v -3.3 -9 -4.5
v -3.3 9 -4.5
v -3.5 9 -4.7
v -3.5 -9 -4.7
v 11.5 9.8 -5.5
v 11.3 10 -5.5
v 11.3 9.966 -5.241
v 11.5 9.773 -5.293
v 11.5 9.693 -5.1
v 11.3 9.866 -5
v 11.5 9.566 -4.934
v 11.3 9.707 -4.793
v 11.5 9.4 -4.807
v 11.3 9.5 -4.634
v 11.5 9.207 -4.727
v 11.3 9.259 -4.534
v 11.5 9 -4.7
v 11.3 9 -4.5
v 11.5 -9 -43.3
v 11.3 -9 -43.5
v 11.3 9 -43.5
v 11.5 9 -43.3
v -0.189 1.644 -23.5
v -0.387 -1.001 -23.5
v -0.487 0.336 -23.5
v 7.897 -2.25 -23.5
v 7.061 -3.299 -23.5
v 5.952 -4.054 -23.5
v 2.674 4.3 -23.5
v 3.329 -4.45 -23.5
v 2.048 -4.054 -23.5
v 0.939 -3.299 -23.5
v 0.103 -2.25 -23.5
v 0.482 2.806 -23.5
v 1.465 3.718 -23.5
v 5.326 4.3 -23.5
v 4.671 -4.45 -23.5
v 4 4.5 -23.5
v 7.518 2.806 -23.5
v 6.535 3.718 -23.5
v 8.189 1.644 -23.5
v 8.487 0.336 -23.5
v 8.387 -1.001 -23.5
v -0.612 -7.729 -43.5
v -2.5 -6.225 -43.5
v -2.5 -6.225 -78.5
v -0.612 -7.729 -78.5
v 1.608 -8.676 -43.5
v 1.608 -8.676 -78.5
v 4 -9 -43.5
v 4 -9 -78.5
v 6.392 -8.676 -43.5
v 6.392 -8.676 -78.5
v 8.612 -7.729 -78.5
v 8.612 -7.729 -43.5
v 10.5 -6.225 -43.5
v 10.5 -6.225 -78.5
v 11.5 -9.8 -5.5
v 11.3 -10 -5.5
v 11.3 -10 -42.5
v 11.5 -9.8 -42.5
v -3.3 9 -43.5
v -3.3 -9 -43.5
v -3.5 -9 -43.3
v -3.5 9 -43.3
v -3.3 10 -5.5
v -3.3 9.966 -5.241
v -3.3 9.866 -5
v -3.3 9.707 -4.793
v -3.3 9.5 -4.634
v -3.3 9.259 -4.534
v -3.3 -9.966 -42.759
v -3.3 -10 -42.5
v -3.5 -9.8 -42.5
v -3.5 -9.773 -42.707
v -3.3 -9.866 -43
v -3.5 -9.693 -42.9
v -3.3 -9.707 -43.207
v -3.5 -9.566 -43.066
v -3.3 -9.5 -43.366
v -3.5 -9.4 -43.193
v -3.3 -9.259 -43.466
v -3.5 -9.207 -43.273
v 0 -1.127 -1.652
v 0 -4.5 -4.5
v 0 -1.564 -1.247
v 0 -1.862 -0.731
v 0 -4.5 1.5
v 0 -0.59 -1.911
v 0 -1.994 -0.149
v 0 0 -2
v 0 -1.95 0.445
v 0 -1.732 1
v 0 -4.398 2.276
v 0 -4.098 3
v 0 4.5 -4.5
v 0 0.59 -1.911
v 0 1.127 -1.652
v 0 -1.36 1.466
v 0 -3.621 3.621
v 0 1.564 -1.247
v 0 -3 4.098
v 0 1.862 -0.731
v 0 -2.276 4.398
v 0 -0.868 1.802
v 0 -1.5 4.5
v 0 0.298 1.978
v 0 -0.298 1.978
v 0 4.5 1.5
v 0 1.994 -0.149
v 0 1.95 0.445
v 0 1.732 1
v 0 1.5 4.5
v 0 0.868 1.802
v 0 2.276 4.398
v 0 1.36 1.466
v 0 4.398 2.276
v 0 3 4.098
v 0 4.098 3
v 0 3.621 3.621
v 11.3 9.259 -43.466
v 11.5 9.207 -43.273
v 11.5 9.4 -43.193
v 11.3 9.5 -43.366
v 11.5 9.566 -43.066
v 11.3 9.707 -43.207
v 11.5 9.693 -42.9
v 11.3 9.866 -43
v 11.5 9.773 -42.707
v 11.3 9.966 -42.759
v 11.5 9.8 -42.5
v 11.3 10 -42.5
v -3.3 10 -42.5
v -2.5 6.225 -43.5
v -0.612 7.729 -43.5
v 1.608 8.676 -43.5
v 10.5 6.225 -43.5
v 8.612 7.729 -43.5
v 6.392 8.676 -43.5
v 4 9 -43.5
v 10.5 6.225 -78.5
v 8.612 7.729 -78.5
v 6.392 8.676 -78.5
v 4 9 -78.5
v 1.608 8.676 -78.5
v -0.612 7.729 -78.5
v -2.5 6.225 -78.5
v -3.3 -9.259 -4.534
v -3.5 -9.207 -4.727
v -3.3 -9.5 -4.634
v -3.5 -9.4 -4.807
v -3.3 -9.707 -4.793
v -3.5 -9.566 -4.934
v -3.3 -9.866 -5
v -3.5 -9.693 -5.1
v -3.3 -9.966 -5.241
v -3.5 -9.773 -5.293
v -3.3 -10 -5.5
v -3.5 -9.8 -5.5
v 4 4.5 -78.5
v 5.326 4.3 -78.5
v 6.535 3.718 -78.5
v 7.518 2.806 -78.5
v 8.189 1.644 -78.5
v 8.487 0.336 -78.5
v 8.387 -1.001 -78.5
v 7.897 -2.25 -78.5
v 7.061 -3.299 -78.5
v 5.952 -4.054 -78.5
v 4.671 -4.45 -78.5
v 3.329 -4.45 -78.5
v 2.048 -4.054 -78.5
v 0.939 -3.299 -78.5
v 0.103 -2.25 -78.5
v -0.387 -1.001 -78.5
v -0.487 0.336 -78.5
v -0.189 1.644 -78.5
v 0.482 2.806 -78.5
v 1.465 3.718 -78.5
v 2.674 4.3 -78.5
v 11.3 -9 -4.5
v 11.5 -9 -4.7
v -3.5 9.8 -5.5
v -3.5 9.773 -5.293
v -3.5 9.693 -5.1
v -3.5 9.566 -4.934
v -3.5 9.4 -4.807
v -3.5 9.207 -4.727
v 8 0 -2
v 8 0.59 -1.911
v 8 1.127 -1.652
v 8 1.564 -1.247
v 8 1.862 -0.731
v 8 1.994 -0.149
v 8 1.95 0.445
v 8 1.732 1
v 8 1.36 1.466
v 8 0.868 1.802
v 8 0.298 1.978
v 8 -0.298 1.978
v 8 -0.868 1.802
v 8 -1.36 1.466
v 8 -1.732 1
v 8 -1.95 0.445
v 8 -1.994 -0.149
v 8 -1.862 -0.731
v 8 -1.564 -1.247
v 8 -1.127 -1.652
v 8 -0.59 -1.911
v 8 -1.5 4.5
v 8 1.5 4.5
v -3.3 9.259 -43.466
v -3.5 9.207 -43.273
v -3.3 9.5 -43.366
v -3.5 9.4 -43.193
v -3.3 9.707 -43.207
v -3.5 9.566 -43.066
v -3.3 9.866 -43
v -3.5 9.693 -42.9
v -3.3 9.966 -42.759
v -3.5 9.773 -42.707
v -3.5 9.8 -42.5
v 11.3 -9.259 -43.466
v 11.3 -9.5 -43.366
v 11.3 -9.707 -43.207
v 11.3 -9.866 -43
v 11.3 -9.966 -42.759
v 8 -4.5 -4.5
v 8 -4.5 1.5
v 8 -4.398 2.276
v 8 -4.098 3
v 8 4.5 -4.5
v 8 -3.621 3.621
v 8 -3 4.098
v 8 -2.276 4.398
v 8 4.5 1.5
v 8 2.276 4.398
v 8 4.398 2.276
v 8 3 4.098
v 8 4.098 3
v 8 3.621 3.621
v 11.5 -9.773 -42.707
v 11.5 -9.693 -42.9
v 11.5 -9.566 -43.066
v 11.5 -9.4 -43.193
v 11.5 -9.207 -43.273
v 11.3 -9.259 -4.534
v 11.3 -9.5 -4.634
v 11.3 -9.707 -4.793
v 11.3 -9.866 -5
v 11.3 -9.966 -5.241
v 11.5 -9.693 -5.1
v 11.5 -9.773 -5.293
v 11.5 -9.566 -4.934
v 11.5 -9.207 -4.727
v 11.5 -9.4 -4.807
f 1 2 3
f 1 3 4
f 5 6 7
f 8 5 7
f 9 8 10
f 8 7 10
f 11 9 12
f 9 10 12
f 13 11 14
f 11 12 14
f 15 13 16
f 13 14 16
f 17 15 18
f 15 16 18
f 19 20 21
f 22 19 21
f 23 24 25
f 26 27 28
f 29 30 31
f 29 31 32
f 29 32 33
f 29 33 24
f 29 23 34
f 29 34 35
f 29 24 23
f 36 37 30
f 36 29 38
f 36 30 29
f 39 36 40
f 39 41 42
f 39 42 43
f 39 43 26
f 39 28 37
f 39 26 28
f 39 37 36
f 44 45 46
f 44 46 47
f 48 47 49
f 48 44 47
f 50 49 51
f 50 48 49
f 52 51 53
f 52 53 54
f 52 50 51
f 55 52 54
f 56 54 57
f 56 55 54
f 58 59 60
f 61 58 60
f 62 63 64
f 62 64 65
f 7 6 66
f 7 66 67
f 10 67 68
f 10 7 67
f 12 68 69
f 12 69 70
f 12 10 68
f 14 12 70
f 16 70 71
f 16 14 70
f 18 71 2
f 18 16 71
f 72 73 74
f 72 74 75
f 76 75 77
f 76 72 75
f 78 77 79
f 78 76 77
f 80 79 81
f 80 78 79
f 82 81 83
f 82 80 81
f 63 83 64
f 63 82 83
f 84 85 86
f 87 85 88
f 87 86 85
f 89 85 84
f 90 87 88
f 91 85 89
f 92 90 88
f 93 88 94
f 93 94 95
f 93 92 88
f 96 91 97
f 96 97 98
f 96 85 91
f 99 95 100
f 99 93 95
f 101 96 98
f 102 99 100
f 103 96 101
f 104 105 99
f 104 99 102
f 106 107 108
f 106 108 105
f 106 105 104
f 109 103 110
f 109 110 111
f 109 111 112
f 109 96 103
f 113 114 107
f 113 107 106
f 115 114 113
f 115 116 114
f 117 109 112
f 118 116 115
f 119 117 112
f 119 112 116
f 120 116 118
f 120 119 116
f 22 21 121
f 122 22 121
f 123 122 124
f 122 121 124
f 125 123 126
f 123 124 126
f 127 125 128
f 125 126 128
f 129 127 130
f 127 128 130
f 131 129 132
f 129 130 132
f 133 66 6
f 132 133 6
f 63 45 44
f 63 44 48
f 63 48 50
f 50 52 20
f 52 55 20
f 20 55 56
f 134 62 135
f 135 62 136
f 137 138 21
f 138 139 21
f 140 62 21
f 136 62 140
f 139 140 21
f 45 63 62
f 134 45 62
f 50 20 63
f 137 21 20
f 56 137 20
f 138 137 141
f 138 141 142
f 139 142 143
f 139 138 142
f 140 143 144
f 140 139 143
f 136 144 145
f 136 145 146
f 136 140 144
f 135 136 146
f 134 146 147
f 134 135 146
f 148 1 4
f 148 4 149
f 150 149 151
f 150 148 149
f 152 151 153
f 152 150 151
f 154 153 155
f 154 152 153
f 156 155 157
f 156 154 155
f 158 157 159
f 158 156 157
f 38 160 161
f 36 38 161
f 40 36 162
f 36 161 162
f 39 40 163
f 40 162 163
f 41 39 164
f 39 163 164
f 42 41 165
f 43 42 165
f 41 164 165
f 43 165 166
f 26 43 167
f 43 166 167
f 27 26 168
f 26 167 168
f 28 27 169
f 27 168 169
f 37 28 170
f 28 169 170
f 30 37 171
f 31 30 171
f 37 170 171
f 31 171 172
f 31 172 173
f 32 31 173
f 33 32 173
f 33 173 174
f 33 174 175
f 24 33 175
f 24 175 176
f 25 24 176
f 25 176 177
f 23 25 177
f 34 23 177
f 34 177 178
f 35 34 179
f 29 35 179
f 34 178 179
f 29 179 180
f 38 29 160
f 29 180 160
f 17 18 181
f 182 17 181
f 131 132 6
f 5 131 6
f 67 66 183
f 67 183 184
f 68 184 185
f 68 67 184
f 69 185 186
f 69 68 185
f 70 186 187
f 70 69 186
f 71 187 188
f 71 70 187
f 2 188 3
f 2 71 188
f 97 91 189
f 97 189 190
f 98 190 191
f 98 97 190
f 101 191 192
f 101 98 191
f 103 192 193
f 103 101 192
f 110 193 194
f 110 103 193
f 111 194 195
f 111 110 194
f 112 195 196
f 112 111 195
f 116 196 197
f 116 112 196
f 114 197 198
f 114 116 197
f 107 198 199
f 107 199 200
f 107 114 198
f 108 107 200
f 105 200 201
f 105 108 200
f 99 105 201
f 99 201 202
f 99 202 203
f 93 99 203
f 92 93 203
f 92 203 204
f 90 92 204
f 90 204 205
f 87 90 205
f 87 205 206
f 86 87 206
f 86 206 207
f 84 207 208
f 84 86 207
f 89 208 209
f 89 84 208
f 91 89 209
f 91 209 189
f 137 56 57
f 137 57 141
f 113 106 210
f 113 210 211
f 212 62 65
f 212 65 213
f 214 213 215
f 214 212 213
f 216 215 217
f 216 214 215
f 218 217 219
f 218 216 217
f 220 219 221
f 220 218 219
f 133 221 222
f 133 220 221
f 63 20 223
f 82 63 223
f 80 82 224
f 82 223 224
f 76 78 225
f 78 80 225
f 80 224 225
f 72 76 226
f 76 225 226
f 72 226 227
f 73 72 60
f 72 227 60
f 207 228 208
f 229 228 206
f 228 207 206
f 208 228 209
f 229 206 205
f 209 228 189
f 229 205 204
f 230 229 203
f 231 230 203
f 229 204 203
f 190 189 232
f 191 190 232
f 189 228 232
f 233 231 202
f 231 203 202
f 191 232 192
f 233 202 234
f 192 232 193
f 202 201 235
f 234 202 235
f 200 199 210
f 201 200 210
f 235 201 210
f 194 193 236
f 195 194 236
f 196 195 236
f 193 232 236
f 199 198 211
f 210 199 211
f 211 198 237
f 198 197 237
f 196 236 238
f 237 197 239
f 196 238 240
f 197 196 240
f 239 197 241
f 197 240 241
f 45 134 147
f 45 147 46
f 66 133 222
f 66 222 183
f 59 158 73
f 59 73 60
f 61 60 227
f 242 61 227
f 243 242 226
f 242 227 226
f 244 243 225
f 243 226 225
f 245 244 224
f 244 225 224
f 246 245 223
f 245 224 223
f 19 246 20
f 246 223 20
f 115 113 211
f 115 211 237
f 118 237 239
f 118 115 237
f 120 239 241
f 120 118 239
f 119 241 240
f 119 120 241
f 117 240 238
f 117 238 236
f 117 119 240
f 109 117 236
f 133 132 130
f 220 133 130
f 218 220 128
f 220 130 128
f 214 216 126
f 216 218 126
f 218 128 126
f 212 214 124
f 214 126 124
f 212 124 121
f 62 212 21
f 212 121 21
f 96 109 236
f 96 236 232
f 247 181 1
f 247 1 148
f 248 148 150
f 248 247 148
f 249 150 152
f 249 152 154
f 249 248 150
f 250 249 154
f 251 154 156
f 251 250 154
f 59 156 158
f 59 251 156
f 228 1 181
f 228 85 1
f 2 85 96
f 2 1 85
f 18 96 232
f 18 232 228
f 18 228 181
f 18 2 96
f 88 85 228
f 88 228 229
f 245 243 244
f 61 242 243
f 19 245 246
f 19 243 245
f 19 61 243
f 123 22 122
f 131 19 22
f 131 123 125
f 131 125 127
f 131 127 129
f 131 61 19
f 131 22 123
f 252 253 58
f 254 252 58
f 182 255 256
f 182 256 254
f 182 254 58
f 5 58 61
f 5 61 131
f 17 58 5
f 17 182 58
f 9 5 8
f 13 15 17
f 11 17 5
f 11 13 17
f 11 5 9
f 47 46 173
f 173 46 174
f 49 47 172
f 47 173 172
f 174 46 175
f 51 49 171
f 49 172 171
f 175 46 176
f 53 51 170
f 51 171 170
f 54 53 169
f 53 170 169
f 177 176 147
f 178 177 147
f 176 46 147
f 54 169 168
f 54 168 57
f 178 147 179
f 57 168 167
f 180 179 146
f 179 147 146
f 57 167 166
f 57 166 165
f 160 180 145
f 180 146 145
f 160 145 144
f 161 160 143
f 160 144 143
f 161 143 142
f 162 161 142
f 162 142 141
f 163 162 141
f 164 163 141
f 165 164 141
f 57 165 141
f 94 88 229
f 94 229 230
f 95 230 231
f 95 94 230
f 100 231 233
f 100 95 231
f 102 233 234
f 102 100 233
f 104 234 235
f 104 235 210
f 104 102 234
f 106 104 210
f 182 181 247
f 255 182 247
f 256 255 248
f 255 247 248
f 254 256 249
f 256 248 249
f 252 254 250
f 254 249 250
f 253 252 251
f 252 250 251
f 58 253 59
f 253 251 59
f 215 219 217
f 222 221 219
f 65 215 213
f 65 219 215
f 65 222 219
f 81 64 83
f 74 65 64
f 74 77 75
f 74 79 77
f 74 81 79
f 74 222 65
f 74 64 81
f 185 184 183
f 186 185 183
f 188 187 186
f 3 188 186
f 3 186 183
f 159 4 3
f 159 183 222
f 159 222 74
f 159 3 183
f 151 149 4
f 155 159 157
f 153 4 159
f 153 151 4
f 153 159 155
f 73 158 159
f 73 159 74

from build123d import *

# Parameters (mm, degrees)
SKETCH_1_R          = 2
EXTRUDE_1_DEPTH     = 8
EXTRUDE_2_DEPTH     = 39
EXTRUDE_3_DEPTH     = 35
SKETCH_4_R          = 4.5
CUT_EXTRUDE_1_DEPTH = 55
FILLET_1_R          = 1
CHAMFER_1_SIZE      = 0.2


with BuildPart() as part:
    # 草图1 → 凸台-拉伸1 (new body)
    with BuildSketch(Plane(origin=(0, 0, 0), x_dir=(0, 0, -1), z_dir=(1, 0, 0))):
        with BuildLine():
            Line((0, 4.5), (4.5, 4.5))
            Line((4.5, 4.5), (4.5, -4.5))
            Line((4.5, -4.5), (-1.5, -4.5))
            ThreePointArc((-1.5, -4.5), (-3.621320344, -3.621320344), (-4.5, -1.5))
            Line((-4.5, -1.5), (-4.5, 1.5))
            ThreePointArc((-4.5, 1.5), (-3.621320344, 3.621320344), (-1.5, 4.5))
            Line((-1.5, 4.5), (0, 4.5))
        make_face()
        Circle(SKETCH_1_R, mode=Mode.SUBTRACT)
    extrude(amount=EXTRUDE_1_DEPTH)

    # 草图2 → 凸台-拉伸2 (add)
    with BuildSketch(Plane(origin=(0, 0, -4.5), x_dir=(-1, 0, 0), z_dir=(0, 0, -1))):
        Polygon((-4, 10), (3.5, 10), (3.5, -10), (-11.5, -10), (-11.5, 10), align=None)
    extrude(amount=EXTRUDE_2_DEPTH)

    # 草图3 → 凸台-拉伸3 (add)
    with BuildSketch(Plane(origin=(0, 0, -43.5), x_dir=(-1, 0, 0), z_dir=(0, 0, -1))):
        with BuildLine():
            Line((2.5, 6.224949799), (2.5, -6.224949799))
            ThreePointArc((2.5, -6.224949799), (-4, -9), (-10.5, -6.224949799))
            Line((-10.5, -6.224949799), (-10.5, 6.224949799))
            ThreePointArc((-10.5, 6.224949799), (-4, 9), (2.5, 6.224949799))
        make_face()
    extrude(amount=EXTRUDE_3_DEPTH)

    # 草图4 → 切除-拉伸1 (cut)
    with BuildSketch(Plane(origin=(0, 0, -78.5), x_dir=(-1, 0, 0), z_dir=(0, 0, -1))):
        with Locations(Location((-4, 0, 0), (0, 0, 90))):
            Circle(SKETCH_4_R)
    extrude(amount=-CUT_EXTRUDE_1_DEPTH, mode=Mode.SUBTRACT)

    # 圆角1
    fillet_1_edges = [part.edges().sort_by_distance(p)[0] for p in [
        (4, -10, -4.5),
        (4, 10, -4.5),
        (4, 10, -43.5),
        (4, -10, -43.5),
    ]]
    fillet(fillet_1_edges, radius=FILLET_1_R - 0.0001)  # a hair under: the kernel refuses the full size

    # 倒角1
    chamfer_1_edges = [part.edges().sort_by_distance(p)[0] for p in [
        (-3.5, -10, -24),
        (11.5, -10, -24),
        (-3.5, 0, -4.5),
        (-3.5, 10, -24),
        (-3.5, 0, -43.5),
        (-3.5, 9.707136071, -4.792863929),
        (-3.5, 9.707136071, -43.207136071),
        (-3.5, -9.707136071, -43.207136071),
        (-3.5, -9.707136071, -4.792863929),
        (11.5, 0, -4.5),
        (11.5, 0, -43.5),
        (11.5, 10, -24),
        (11.5, 9.707136071, -4.792863929),
        (11.5, 9.707136071, -43.207136071),
        (11.5, -9.707136071, -43.207136071),
        (11.5, -9.707136071, -4.792863929),
    ]]
    chamfer(chamfer_1_edges, length=CHAMFER_1_SIZE)


solid = part.part
